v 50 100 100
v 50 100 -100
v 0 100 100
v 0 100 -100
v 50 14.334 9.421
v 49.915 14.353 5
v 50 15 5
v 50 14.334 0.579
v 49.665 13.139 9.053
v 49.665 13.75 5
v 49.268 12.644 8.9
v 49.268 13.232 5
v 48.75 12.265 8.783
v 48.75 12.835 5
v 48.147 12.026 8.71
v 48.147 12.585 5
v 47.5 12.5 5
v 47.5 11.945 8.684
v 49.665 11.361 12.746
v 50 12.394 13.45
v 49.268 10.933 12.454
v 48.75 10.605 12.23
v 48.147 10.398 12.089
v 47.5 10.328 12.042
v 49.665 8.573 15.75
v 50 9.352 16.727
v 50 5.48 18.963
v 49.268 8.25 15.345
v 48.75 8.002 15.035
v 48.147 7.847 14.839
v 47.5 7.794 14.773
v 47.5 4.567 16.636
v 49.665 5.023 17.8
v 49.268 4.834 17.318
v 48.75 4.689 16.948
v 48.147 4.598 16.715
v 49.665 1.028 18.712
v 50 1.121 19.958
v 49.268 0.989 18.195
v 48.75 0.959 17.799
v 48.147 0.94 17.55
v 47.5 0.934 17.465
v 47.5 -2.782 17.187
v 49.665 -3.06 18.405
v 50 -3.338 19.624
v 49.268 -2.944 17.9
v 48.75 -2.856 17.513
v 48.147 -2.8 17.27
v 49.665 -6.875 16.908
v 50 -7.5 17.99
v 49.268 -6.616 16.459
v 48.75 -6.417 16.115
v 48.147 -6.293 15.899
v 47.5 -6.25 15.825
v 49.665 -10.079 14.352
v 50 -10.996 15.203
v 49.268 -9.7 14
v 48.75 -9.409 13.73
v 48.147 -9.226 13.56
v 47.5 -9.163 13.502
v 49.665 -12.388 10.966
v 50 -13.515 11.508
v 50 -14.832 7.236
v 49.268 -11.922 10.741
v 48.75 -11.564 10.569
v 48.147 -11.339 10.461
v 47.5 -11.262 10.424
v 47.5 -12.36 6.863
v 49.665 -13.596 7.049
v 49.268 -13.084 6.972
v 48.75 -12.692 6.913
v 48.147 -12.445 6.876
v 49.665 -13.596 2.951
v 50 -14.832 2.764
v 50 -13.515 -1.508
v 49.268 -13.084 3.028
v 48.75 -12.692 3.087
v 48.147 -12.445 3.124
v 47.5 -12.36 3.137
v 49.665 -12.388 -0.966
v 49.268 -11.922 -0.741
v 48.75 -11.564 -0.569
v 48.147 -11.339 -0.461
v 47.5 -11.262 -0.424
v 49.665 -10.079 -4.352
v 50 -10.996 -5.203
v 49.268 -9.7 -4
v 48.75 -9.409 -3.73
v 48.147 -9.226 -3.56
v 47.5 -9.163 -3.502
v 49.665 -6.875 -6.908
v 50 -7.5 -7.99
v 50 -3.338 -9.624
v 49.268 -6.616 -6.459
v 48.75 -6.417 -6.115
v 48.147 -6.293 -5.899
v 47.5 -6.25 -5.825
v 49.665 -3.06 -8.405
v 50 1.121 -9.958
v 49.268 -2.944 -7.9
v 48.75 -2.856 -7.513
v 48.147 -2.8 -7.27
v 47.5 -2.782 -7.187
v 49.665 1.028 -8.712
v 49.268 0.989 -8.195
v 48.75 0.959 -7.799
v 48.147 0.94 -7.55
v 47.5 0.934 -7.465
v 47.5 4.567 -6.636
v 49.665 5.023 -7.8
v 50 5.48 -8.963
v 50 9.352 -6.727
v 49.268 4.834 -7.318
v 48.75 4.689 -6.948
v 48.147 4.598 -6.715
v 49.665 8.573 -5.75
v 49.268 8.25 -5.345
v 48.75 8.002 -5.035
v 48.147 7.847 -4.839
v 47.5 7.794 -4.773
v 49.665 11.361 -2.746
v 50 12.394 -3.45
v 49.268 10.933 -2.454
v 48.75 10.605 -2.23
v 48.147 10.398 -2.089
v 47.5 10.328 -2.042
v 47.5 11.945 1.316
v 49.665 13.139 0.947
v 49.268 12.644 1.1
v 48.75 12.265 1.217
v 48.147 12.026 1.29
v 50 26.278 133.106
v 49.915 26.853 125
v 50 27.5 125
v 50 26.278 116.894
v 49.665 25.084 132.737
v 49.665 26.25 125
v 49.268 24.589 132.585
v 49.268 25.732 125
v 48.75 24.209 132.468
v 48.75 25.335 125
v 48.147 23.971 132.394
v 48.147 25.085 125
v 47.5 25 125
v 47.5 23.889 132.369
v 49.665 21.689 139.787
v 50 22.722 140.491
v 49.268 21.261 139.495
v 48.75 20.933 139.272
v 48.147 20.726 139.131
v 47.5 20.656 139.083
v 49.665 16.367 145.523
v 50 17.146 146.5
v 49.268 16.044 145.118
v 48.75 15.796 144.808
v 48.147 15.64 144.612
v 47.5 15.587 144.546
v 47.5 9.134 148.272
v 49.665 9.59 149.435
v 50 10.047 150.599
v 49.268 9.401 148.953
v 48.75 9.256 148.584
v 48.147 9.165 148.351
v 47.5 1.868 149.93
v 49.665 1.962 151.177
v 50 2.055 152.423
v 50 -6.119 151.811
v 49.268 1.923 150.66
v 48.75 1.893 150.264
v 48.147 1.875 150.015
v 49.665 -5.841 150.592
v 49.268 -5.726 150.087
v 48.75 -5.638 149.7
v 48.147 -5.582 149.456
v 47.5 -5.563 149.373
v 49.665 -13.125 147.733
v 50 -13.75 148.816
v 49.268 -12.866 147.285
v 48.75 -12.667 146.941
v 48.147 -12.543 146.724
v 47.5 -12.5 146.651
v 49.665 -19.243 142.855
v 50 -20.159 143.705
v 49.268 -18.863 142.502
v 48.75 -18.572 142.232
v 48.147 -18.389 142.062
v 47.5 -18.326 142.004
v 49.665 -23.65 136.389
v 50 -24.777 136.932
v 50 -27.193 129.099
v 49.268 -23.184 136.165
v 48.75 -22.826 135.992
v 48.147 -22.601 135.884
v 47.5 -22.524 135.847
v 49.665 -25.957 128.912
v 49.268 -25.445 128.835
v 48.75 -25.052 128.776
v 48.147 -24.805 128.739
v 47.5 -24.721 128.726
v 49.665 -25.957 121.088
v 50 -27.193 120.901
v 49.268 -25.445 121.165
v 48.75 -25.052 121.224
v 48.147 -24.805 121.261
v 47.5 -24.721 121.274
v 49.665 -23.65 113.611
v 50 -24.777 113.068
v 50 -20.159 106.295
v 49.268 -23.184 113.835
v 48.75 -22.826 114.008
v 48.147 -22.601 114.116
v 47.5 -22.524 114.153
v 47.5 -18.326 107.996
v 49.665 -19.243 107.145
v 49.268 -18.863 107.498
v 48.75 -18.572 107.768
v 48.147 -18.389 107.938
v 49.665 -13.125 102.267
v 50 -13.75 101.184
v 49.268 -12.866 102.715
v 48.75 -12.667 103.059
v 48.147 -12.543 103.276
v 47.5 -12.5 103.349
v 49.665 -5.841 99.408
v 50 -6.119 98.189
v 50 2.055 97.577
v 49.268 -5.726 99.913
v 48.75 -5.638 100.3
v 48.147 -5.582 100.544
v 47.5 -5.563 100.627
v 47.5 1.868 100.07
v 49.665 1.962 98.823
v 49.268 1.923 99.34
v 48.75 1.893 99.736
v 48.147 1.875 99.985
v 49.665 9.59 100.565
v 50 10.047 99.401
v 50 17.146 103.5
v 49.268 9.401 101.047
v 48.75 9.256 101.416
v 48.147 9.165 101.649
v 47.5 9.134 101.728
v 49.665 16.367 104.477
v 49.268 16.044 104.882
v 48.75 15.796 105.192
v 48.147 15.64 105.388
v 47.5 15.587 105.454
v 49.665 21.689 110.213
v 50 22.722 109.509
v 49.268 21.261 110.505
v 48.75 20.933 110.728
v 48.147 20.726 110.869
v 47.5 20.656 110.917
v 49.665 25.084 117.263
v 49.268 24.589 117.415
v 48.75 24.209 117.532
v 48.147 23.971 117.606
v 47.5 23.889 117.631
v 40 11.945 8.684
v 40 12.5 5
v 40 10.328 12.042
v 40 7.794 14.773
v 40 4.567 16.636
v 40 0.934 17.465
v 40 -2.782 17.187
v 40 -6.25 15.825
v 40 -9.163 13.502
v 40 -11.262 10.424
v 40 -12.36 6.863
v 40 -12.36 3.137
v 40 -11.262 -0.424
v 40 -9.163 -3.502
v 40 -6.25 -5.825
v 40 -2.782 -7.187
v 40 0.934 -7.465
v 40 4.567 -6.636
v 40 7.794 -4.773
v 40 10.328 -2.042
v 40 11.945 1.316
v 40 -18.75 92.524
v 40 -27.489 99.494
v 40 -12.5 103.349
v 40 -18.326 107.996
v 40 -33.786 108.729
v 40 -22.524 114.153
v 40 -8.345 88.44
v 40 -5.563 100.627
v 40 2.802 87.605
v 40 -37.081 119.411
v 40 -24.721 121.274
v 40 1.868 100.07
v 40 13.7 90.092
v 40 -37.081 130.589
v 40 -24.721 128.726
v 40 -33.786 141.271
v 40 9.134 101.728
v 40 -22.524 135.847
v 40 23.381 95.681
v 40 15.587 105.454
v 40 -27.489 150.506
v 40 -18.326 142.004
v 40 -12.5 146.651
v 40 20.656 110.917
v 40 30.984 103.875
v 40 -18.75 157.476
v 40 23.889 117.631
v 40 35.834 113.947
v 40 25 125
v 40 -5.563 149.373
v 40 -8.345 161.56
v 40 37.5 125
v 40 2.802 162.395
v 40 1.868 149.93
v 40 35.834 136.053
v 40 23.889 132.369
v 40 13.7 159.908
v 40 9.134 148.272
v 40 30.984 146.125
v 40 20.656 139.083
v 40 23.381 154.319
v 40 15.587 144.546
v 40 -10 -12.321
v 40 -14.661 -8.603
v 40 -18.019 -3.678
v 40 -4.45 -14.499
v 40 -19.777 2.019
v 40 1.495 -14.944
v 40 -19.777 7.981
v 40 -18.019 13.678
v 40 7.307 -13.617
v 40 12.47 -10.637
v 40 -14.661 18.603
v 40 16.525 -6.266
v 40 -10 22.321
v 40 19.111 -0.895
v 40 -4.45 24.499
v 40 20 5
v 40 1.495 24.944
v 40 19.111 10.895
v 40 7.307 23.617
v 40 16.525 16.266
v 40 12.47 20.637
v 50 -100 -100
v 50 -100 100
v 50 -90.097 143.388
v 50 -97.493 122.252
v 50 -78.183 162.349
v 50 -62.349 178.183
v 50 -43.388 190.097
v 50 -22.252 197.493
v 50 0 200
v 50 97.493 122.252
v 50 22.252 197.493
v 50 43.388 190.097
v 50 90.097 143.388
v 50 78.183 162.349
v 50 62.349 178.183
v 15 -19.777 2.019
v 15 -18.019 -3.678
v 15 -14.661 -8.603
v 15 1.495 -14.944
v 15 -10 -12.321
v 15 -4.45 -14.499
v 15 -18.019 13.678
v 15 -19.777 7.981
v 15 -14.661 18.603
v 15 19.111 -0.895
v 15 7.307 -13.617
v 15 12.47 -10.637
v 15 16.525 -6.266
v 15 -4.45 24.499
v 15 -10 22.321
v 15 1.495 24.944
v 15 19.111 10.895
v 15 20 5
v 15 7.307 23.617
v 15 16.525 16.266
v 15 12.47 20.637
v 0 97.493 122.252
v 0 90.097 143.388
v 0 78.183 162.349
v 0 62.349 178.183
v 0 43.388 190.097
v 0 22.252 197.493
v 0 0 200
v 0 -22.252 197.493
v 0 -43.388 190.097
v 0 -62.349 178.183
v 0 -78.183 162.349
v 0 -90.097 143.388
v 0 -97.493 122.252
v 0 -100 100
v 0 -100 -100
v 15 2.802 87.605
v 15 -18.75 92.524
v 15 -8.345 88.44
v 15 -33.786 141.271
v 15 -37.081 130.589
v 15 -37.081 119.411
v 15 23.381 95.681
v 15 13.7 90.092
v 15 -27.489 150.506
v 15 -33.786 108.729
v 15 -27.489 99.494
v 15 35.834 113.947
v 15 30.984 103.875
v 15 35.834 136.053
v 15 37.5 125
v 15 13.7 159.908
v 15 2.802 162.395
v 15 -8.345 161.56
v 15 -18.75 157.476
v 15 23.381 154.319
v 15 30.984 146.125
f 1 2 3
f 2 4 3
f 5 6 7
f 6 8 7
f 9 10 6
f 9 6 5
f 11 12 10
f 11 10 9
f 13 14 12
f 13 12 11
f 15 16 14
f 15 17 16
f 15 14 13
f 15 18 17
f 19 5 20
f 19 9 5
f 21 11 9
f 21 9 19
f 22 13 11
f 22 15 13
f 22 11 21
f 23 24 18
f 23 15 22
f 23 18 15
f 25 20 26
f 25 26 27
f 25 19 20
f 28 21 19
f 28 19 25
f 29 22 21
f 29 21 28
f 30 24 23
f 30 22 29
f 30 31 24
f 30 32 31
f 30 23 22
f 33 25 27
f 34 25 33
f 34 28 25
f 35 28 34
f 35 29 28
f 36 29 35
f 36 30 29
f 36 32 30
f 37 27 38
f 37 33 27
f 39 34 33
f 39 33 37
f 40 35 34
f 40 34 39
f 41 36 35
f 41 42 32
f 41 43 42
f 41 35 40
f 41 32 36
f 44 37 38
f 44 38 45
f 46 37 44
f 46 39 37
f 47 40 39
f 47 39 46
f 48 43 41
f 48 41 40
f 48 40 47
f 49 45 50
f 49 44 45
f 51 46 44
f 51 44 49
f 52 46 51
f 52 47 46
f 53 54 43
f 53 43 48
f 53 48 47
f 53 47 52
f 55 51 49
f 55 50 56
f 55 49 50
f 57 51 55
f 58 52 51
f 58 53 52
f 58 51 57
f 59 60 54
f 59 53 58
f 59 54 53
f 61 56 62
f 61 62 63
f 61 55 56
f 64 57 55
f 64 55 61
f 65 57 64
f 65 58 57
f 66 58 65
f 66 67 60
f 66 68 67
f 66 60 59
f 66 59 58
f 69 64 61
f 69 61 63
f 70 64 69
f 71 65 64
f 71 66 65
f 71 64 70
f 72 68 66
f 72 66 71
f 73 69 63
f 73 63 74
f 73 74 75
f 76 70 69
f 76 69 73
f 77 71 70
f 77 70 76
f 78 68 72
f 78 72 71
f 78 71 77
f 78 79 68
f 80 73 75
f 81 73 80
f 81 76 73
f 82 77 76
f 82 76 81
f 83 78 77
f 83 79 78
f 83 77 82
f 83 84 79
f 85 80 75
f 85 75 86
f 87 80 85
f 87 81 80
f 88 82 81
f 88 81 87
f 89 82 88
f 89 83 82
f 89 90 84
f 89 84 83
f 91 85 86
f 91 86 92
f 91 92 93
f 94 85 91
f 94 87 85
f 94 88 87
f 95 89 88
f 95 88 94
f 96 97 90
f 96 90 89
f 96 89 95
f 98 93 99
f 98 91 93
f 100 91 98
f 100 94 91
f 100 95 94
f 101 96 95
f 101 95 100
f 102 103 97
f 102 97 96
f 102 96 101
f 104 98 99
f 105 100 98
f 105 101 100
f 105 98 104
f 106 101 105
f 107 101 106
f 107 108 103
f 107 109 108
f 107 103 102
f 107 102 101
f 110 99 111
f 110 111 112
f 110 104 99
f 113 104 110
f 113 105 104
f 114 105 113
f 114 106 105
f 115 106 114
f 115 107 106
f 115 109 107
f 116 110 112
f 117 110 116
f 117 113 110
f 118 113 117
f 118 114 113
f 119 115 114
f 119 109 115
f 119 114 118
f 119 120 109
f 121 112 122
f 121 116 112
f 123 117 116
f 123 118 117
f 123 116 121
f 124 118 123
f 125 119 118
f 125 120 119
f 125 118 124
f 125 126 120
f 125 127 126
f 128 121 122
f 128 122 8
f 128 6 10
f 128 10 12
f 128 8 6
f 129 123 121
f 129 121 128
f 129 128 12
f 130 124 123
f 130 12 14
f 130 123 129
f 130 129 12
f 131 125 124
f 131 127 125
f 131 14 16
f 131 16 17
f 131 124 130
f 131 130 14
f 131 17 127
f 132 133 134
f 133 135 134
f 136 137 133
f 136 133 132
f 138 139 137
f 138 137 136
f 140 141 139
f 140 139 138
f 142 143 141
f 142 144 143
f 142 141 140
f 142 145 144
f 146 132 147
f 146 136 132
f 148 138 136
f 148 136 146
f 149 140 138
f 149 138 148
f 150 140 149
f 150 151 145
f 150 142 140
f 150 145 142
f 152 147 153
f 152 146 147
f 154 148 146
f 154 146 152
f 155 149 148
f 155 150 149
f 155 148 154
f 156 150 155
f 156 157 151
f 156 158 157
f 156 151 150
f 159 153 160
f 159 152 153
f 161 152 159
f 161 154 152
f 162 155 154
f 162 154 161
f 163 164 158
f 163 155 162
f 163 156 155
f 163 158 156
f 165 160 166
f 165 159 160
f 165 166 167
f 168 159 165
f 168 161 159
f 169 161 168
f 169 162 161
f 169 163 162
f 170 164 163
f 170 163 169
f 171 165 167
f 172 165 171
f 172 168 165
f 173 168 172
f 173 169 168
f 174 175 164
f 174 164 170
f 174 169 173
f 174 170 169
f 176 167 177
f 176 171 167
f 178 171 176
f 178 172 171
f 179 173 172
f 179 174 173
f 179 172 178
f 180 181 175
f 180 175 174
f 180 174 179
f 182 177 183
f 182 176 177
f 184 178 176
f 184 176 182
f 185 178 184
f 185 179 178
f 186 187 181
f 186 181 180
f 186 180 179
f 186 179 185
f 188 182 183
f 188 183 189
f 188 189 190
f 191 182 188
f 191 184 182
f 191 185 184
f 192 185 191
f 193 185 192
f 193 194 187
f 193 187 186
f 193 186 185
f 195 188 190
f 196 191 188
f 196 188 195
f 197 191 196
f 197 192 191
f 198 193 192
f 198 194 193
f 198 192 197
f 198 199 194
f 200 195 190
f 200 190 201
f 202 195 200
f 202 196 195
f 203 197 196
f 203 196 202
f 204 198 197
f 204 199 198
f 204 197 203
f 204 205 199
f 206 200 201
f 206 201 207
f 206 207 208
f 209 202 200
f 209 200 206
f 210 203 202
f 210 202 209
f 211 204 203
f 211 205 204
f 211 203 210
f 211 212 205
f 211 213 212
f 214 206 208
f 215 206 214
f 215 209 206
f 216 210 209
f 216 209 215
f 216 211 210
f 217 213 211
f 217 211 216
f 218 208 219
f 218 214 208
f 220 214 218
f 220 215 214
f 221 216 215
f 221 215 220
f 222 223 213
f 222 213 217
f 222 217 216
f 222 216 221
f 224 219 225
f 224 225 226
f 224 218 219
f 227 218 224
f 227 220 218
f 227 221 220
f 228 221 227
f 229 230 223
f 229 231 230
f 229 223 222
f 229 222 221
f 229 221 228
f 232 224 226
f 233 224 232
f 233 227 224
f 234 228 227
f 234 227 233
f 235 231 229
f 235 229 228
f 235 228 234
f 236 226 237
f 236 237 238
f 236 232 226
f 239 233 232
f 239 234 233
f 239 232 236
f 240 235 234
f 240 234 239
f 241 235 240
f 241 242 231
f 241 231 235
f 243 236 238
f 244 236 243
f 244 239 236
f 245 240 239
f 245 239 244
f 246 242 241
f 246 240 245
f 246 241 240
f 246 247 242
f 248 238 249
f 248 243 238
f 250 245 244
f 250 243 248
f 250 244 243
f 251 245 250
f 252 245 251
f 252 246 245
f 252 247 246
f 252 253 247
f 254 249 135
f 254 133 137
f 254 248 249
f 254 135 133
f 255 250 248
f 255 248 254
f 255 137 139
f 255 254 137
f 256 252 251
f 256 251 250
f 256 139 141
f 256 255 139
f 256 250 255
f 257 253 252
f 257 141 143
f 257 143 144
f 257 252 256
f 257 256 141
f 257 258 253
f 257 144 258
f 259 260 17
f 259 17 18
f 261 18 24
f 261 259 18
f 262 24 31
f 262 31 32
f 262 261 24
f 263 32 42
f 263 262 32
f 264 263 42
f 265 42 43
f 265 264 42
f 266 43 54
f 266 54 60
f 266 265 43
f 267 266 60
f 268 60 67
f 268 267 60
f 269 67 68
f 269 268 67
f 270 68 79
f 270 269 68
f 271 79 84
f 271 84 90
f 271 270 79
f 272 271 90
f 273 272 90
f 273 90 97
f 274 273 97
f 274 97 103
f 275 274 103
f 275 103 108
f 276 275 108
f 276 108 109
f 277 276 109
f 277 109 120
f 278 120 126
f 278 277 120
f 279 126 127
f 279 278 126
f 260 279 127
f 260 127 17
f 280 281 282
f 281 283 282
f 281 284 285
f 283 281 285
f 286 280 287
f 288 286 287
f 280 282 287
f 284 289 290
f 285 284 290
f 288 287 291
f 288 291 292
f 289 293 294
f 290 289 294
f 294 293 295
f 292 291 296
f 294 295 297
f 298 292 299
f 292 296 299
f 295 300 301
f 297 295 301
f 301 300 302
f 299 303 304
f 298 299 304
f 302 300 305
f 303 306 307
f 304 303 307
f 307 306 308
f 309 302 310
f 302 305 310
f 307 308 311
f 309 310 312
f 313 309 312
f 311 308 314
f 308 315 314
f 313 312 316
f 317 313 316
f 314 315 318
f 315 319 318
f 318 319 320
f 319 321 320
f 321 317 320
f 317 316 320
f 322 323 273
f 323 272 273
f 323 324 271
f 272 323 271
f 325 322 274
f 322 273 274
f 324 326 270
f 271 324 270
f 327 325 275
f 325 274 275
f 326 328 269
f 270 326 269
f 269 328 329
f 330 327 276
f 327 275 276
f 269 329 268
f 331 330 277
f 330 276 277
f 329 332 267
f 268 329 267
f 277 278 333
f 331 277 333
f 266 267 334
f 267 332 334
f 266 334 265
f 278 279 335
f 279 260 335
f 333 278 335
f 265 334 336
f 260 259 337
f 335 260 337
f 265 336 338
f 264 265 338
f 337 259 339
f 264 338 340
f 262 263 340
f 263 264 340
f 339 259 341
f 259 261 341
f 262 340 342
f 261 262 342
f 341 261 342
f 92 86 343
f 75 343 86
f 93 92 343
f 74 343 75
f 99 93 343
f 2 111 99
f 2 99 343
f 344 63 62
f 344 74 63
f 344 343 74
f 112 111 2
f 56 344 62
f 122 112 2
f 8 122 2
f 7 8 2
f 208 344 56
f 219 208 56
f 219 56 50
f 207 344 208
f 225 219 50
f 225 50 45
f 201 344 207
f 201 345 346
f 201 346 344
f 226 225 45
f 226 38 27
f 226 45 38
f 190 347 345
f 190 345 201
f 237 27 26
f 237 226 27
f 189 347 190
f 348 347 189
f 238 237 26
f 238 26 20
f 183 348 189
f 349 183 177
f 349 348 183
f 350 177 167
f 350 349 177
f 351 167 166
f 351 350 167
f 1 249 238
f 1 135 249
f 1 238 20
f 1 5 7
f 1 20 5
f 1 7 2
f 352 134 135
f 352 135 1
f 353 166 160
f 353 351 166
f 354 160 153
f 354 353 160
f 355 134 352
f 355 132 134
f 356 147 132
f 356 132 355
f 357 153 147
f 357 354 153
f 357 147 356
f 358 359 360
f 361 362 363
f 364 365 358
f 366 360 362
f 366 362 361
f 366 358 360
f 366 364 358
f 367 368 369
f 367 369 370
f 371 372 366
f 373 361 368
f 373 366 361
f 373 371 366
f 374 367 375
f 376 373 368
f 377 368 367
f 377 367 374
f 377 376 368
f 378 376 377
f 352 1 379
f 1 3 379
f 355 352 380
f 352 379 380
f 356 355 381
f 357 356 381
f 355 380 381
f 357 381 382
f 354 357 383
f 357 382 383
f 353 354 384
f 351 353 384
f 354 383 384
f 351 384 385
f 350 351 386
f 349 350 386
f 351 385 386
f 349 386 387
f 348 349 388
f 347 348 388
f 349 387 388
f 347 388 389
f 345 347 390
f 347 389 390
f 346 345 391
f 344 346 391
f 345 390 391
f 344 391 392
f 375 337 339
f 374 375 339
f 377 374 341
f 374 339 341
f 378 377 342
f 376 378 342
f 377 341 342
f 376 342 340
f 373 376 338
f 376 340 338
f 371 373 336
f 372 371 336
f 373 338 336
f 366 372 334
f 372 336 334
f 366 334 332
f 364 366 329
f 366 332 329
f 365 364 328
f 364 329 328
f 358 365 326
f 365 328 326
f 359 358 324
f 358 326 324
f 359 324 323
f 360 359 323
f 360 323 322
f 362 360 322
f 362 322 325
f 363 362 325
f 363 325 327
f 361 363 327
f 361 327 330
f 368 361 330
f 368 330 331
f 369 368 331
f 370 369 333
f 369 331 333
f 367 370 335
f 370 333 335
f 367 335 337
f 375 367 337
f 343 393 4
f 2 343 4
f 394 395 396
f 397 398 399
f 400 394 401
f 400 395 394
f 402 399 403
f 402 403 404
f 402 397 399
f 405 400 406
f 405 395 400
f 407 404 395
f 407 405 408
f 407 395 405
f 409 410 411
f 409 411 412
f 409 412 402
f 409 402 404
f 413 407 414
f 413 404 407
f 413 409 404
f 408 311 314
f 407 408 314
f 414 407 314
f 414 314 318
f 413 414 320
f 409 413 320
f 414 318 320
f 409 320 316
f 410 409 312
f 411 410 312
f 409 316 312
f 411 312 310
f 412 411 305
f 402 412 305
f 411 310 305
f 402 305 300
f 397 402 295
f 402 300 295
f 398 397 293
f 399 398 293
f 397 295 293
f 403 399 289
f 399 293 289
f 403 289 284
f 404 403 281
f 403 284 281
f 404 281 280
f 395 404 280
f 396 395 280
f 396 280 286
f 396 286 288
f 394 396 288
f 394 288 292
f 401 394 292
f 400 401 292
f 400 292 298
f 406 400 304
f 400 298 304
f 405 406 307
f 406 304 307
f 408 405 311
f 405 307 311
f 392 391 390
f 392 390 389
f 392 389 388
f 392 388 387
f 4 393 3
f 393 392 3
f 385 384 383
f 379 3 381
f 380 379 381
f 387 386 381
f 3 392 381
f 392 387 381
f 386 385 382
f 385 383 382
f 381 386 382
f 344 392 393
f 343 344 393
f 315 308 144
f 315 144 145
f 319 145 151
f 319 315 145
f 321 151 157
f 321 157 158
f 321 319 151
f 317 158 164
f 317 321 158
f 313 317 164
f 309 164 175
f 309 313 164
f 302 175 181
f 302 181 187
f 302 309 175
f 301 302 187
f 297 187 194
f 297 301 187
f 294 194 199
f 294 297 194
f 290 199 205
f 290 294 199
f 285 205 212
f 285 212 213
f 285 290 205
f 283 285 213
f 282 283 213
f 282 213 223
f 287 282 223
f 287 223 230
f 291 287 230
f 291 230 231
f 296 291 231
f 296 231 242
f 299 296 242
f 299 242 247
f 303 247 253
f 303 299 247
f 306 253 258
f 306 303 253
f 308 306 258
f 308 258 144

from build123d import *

# Parameters (mm, degrees)
F1_DEPTH = 40
F2_R     = 37.5
F2_R_2   = 20
F4_DEPTH = 25
F5_R     = 12.5
F5_R_2   = 25
F6_DEPTH = 10
F7_R     = 2.5


with BuildPart() as f1:
    # F0 (on Right) → F1 (new body)
    with BuildSketch(Plane.YZ):
        with BuildLine():
            Line((-100, -100), (100, -100))
            Line((100, -100), (100, 100))
            ThreePointArc((100, 100), (0, 200), (-100, 100))
            Line((-100, 100), (-100, -100))
        make_face()
    extrude(amount=F1_DEPTH)

    # F2 (on face) → F4 (cut)
    with BuildSketch(Plane.YZ.offset(40)):
        with Locations((0, 125)):
            Circle(F2_R)
        with Locations((0, 5)):
            Circle(F2_R_2)
    extrude(amount=-F4_DEPTH, mode=Mode.SUBTRACT)

    # F5 (on face) → F6 (join)
    with BuildSketch(Plane.YZ.offset(40)):
        with BuildLine():
            Line((-100, -100), (100, -100))
            Line((100, -100), (100, 100))
            ThreePointArc((100, 100), (0, 200), (-100, 100))
            Line((-100, 100), (-100, -100))
        make_face()
        with Locations((0, 5)):
            Circle(F5_R, mode=Mode.SUBTRACT)
        with Locations((0, 125)):
            Circle(F5_R_2, mode=Mode.SUBTRACT)
    extrude(amount=F6_DEPTH)

    # F7
    f7_edges = [f1.edges().sort_by_distance(p)[0] for p in [
        (50, -25, 125),
        (50, -12.5, 5),
    ]]
    fillet(f7_edges, radius=F7_R)


solid = f1.part
